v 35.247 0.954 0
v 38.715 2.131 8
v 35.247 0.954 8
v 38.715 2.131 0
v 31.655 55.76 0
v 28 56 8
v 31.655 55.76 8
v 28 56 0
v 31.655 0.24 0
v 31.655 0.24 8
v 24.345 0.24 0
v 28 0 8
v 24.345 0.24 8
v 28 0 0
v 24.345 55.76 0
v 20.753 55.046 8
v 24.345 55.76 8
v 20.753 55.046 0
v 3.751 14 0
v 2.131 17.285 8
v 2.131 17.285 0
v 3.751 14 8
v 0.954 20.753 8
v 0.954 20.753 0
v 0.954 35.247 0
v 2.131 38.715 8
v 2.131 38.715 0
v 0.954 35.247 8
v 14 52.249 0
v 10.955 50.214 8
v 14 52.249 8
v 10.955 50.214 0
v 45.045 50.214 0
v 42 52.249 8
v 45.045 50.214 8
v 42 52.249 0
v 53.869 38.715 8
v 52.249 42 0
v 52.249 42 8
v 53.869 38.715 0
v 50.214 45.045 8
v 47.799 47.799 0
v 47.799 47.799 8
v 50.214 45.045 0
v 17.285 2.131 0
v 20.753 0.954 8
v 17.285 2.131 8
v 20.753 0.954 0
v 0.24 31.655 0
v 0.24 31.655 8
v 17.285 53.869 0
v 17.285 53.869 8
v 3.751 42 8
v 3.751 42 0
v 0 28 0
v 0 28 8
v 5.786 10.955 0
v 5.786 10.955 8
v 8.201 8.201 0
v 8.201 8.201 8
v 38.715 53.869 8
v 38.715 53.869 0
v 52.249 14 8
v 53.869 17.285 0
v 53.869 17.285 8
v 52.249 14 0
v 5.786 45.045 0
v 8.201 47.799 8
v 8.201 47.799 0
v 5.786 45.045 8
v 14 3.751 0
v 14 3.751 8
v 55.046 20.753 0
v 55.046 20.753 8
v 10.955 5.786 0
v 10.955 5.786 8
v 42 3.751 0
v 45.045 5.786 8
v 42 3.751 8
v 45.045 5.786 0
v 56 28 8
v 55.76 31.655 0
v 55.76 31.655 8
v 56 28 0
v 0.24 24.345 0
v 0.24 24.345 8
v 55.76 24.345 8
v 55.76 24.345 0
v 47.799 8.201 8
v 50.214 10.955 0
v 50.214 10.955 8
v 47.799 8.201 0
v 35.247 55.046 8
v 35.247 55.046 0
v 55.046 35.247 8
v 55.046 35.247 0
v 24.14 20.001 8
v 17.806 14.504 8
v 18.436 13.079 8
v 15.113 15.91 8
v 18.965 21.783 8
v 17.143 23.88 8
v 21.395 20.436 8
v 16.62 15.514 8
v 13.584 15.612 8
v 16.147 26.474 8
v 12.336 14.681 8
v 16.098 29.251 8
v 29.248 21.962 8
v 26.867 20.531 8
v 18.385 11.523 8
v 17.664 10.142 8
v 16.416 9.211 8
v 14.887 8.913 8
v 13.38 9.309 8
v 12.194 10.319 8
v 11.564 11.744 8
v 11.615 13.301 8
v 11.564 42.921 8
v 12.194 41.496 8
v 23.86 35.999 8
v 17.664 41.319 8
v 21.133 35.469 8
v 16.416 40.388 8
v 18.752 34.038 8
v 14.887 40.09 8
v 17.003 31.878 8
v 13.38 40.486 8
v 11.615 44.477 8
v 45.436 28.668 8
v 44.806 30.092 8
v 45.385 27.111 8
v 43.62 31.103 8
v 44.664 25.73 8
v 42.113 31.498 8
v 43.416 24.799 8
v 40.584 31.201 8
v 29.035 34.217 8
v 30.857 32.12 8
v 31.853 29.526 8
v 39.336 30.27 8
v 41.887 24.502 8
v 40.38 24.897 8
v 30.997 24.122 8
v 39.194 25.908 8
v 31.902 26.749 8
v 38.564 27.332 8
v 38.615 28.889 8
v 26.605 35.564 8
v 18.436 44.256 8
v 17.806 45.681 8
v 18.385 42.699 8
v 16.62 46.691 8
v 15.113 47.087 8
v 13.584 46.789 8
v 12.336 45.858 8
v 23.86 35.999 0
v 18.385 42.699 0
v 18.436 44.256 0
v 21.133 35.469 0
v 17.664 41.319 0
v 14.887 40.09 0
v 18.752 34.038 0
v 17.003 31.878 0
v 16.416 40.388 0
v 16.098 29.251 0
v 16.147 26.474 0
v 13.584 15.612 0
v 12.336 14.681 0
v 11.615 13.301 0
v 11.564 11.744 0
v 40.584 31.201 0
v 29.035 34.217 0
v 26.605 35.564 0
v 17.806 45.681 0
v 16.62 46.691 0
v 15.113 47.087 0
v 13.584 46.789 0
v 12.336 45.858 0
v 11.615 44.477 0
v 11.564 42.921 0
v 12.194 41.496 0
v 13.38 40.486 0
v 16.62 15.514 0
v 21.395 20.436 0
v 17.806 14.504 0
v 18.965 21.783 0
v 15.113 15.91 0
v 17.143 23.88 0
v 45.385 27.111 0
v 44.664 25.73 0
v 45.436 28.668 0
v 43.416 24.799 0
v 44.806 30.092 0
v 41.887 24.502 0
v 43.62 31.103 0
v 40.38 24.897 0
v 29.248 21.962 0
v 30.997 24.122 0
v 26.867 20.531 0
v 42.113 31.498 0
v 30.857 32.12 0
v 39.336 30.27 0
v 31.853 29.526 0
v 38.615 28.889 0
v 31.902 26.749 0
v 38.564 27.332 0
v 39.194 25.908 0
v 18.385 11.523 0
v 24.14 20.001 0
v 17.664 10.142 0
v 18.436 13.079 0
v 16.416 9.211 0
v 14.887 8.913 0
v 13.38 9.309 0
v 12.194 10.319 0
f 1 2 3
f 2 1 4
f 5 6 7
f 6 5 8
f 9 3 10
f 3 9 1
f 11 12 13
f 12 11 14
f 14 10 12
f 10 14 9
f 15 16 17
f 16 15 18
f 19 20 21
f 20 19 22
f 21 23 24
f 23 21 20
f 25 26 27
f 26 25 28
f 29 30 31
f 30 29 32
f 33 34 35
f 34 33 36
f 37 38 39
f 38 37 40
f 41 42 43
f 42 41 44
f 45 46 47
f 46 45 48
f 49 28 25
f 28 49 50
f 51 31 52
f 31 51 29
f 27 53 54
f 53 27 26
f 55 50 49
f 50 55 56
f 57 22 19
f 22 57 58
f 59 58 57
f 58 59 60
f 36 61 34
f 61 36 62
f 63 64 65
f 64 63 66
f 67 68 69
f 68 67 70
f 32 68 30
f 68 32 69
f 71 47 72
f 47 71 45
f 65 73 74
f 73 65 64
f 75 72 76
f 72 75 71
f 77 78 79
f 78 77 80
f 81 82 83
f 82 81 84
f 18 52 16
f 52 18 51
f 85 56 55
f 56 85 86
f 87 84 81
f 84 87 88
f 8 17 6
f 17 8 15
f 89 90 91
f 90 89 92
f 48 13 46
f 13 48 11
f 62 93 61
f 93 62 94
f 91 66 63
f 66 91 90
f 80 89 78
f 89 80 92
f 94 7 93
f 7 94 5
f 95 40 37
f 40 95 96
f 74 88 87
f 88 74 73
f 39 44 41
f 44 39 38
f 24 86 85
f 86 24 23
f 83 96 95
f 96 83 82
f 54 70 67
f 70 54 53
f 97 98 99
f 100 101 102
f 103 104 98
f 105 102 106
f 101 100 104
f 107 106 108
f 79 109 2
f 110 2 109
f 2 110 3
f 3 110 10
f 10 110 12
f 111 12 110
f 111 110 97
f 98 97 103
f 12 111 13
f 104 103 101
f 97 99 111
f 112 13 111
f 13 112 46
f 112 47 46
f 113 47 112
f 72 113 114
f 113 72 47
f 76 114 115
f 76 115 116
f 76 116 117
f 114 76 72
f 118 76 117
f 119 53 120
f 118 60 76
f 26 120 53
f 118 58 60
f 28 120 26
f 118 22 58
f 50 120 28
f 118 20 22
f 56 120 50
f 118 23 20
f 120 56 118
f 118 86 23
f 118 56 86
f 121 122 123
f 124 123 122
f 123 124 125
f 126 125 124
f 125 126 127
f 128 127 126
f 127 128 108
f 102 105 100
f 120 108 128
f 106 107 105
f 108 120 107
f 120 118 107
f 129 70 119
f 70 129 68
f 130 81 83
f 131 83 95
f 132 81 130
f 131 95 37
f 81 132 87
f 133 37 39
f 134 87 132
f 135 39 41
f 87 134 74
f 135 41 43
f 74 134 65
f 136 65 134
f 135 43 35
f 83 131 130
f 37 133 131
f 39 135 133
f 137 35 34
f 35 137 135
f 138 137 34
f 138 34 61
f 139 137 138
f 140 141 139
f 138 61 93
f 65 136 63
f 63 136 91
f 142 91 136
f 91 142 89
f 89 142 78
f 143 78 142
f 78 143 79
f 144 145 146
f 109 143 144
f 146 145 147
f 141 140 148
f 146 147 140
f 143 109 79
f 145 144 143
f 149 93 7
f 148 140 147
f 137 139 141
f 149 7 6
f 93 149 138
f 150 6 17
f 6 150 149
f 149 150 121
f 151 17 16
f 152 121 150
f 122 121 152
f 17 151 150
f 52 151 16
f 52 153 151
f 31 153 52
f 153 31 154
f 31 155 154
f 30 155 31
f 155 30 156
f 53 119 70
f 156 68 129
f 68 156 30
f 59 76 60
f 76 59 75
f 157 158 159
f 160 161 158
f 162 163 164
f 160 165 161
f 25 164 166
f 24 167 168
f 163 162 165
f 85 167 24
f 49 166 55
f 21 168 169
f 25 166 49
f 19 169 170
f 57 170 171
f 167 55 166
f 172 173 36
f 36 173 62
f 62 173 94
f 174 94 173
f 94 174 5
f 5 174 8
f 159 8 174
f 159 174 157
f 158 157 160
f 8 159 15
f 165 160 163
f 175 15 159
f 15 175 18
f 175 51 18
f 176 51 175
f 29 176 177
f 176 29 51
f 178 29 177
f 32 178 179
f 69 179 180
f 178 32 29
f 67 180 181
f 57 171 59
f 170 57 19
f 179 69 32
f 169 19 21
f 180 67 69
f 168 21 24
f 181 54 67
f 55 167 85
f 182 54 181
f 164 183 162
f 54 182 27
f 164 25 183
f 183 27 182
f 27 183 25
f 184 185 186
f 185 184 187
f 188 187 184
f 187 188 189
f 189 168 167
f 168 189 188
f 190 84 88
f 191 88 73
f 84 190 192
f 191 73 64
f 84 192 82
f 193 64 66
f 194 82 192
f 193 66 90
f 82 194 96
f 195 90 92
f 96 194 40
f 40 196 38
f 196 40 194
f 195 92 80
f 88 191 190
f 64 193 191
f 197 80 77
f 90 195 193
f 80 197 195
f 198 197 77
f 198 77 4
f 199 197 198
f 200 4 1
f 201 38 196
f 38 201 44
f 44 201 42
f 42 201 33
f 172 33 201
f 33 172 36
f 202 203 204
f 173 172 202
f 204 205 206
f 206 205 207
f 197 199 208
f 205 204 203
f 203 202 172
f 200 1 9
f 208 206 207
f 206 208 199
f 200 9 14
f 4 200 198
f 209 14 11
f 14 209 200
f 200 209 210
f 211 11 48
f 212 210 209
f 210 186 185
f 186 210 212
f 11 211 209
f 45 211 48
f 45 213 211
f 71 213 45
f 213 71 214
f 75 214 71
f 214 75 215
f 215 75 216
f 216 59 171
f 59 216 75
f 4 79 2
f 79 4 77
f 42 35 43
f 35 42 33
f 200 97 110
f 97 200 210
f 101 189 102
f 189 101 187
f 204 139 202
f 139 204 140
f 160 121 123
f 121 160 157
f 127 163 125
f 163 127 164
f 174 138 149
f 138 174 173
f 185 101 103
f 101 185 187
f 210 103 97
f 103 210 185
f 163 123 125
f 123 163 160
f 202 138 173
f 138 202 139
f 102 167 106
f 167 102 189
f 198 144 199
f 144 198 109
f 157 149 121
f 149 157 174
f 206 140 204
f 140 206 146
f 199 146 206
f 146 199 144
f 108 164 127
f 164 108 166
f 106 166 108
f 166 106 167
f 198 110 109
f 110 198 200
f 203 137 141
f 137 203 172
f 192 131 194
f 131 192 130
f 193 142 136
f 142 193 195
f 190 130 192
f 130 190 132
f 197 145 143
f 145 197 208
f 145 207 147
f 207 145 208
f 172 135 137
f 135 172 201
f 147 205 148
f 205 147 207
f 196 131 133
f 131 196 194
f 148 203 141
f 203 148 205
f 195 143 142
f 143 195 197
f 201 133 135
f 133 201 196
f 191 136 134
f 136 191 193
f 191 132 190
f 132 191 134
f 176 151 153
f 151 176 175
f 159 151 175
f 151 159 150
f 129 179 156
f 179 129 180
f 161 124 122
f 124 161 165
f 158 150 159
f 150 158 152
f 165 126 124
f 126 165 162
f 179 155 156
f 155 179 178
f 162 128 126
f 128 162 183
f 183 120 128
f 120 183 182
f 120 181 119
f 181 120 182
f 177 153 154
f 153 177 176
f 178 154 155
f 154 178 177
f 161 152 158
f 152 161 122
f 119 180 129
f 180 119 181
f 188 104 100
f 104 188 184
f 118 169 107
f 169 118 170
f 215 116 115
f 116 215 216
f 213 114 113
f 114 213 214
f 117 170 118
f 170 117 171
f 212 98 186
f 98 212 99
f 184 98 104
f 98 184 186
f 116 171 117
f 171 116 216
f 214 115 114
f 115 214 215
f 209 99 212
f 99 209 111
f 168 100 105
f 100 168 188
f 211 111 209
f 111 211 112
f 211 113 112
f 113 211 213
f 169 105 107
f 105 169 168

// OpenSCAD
$fn = 32;

// ----------------------------------------------------------------------
// Cam plate: eccentric cam, base R28
// ----------------------------------------------------------------------

// --- parameters (mm) ---
base_r = 28;              // base circle radius
lobe_h = 14;              // cam lobe rise
bore_r = 8;               // shaft bore radius
plate_t = 8;              // plate thickness, Z (extrusion height)
ecc = 4;                  // disc eccentricity
ring_r = 18;              // lightening ring radius
bolt_r = 3.5;             // lightening hole radius

profile = [[56, 28], [55.76, 31.655], [55.046, 35.247], [53.869, 38.715], [52.249, 42], [50.214, 45.045], [47.799, 47.799], [45.045, 50.214], [42, 52.249], [38.715, 53.869], [35.247, 55.046], [31.655, 55.76], [28, 56], [24.345, 55.76], [20.753, 55.046], [17.285, 53.869], [14, 52.249], [10.955, 50.214], [8.201, 47.799], [5.786, 45.045], [3.751, 42], [2.131, 38.715], [0.954, 35.247], [0.24, 31.655], [0, 28], [0.24, 24.345], [0.954, 20.753], [2.131, 17.285], [3.751, 14], [5.786, 10.955], [8.201, 8.201], [10.955, 5.786], [14, 3.751], [17.285, 2.131], [20.753, 0.954], [24.345, 0.24], [28, 0], [31.655, 0.24], [35.247, 0.954], [38.715, 2.131], [42, 3.751], [45.045, 5.786], [47.799, 8.201], [50.214, 10.955], [52.249, 14], [53.869, 17.285], [55.046, 20.753], [55.76, 24.345]];  // primary outline, 48 points, counter clockwise
void_1 = [[31.853, 29.526], [30.857, 32.12], [29.035, 34.217], [26.605, 35.564], [23.86, 35.999], [21.133, 35.469], [18.752, 34.038], [17.003, 31.878], [16.098, 29.251], [16.147, 26.474], [17.143, 23.88], [18.965, 21.783], [21.395, 20.436], [24.14, 20.001], [26.867, 20.531], [29.248, 21.962], [30.997, 24.122], [31.902, 26.749]];  // shaft bore, 18 points
void_2 = [[45.436, 28.668], [44.806, 30.092], [43.62, 31.103], [42.113, 31.498], [40.584, 31.201], [39.336, 30.27], [38.615, 28.889], [38.564, 27.332], [39.194, 25.908], [40.38, 24.897], [41.887, 24.502], [43.416, 24.799], [44.664, 25.73], [45.385, 27.111]];  // lightening hole 1, 14 points
void_3 = [[18.436, 44.256], [17.806, 45.681], [16.62, 46.691], [15.113, 47.087], [13.584, 46.789], [12.336, 45.858], [11.615, 44.477], [11.564, 42.921], [12.194, 41.496], [13.38, 40.486], [14.887, 40.09], [16.416, 40.388], [17.664, 41.319], [18.385, 42.699]];  // lightening hole 2, 14 points
void_4 = [[18.436, 13.079], [17.806, 14.504], [16.62, 15.514], [15.113, 15.91], [13.584, 15.612], [12.336, 14.681], [11.615, 13.301], [11.564, 11.744], [12.194, 10.319], [13.38, 9.309], [14.887, 8.913], [16.416, 9.211], [17.664, 10.142], [18.385, 11.523]];  // lightening hole 3, 14 points

// --- the one profile operation ---
difference() {
  linear_extrude(height = plate_t) polygon(points = profile);
  translate([0, 0, -1])
    linear_extrude(height = plate_t + 2) polygon(points = void_1);
  translate([0, 0, -1])
    linear_extrude(height = plate_t + 2) polygon(points = void_2);
  translate([0, 0, -1])
    linear_extrude(height = plate_t + 2) polygon(points = void_3);
  translate([0, 0, -1])
    linear_extrude(height = plate_t + 2) polygon(points = void_4);
}
